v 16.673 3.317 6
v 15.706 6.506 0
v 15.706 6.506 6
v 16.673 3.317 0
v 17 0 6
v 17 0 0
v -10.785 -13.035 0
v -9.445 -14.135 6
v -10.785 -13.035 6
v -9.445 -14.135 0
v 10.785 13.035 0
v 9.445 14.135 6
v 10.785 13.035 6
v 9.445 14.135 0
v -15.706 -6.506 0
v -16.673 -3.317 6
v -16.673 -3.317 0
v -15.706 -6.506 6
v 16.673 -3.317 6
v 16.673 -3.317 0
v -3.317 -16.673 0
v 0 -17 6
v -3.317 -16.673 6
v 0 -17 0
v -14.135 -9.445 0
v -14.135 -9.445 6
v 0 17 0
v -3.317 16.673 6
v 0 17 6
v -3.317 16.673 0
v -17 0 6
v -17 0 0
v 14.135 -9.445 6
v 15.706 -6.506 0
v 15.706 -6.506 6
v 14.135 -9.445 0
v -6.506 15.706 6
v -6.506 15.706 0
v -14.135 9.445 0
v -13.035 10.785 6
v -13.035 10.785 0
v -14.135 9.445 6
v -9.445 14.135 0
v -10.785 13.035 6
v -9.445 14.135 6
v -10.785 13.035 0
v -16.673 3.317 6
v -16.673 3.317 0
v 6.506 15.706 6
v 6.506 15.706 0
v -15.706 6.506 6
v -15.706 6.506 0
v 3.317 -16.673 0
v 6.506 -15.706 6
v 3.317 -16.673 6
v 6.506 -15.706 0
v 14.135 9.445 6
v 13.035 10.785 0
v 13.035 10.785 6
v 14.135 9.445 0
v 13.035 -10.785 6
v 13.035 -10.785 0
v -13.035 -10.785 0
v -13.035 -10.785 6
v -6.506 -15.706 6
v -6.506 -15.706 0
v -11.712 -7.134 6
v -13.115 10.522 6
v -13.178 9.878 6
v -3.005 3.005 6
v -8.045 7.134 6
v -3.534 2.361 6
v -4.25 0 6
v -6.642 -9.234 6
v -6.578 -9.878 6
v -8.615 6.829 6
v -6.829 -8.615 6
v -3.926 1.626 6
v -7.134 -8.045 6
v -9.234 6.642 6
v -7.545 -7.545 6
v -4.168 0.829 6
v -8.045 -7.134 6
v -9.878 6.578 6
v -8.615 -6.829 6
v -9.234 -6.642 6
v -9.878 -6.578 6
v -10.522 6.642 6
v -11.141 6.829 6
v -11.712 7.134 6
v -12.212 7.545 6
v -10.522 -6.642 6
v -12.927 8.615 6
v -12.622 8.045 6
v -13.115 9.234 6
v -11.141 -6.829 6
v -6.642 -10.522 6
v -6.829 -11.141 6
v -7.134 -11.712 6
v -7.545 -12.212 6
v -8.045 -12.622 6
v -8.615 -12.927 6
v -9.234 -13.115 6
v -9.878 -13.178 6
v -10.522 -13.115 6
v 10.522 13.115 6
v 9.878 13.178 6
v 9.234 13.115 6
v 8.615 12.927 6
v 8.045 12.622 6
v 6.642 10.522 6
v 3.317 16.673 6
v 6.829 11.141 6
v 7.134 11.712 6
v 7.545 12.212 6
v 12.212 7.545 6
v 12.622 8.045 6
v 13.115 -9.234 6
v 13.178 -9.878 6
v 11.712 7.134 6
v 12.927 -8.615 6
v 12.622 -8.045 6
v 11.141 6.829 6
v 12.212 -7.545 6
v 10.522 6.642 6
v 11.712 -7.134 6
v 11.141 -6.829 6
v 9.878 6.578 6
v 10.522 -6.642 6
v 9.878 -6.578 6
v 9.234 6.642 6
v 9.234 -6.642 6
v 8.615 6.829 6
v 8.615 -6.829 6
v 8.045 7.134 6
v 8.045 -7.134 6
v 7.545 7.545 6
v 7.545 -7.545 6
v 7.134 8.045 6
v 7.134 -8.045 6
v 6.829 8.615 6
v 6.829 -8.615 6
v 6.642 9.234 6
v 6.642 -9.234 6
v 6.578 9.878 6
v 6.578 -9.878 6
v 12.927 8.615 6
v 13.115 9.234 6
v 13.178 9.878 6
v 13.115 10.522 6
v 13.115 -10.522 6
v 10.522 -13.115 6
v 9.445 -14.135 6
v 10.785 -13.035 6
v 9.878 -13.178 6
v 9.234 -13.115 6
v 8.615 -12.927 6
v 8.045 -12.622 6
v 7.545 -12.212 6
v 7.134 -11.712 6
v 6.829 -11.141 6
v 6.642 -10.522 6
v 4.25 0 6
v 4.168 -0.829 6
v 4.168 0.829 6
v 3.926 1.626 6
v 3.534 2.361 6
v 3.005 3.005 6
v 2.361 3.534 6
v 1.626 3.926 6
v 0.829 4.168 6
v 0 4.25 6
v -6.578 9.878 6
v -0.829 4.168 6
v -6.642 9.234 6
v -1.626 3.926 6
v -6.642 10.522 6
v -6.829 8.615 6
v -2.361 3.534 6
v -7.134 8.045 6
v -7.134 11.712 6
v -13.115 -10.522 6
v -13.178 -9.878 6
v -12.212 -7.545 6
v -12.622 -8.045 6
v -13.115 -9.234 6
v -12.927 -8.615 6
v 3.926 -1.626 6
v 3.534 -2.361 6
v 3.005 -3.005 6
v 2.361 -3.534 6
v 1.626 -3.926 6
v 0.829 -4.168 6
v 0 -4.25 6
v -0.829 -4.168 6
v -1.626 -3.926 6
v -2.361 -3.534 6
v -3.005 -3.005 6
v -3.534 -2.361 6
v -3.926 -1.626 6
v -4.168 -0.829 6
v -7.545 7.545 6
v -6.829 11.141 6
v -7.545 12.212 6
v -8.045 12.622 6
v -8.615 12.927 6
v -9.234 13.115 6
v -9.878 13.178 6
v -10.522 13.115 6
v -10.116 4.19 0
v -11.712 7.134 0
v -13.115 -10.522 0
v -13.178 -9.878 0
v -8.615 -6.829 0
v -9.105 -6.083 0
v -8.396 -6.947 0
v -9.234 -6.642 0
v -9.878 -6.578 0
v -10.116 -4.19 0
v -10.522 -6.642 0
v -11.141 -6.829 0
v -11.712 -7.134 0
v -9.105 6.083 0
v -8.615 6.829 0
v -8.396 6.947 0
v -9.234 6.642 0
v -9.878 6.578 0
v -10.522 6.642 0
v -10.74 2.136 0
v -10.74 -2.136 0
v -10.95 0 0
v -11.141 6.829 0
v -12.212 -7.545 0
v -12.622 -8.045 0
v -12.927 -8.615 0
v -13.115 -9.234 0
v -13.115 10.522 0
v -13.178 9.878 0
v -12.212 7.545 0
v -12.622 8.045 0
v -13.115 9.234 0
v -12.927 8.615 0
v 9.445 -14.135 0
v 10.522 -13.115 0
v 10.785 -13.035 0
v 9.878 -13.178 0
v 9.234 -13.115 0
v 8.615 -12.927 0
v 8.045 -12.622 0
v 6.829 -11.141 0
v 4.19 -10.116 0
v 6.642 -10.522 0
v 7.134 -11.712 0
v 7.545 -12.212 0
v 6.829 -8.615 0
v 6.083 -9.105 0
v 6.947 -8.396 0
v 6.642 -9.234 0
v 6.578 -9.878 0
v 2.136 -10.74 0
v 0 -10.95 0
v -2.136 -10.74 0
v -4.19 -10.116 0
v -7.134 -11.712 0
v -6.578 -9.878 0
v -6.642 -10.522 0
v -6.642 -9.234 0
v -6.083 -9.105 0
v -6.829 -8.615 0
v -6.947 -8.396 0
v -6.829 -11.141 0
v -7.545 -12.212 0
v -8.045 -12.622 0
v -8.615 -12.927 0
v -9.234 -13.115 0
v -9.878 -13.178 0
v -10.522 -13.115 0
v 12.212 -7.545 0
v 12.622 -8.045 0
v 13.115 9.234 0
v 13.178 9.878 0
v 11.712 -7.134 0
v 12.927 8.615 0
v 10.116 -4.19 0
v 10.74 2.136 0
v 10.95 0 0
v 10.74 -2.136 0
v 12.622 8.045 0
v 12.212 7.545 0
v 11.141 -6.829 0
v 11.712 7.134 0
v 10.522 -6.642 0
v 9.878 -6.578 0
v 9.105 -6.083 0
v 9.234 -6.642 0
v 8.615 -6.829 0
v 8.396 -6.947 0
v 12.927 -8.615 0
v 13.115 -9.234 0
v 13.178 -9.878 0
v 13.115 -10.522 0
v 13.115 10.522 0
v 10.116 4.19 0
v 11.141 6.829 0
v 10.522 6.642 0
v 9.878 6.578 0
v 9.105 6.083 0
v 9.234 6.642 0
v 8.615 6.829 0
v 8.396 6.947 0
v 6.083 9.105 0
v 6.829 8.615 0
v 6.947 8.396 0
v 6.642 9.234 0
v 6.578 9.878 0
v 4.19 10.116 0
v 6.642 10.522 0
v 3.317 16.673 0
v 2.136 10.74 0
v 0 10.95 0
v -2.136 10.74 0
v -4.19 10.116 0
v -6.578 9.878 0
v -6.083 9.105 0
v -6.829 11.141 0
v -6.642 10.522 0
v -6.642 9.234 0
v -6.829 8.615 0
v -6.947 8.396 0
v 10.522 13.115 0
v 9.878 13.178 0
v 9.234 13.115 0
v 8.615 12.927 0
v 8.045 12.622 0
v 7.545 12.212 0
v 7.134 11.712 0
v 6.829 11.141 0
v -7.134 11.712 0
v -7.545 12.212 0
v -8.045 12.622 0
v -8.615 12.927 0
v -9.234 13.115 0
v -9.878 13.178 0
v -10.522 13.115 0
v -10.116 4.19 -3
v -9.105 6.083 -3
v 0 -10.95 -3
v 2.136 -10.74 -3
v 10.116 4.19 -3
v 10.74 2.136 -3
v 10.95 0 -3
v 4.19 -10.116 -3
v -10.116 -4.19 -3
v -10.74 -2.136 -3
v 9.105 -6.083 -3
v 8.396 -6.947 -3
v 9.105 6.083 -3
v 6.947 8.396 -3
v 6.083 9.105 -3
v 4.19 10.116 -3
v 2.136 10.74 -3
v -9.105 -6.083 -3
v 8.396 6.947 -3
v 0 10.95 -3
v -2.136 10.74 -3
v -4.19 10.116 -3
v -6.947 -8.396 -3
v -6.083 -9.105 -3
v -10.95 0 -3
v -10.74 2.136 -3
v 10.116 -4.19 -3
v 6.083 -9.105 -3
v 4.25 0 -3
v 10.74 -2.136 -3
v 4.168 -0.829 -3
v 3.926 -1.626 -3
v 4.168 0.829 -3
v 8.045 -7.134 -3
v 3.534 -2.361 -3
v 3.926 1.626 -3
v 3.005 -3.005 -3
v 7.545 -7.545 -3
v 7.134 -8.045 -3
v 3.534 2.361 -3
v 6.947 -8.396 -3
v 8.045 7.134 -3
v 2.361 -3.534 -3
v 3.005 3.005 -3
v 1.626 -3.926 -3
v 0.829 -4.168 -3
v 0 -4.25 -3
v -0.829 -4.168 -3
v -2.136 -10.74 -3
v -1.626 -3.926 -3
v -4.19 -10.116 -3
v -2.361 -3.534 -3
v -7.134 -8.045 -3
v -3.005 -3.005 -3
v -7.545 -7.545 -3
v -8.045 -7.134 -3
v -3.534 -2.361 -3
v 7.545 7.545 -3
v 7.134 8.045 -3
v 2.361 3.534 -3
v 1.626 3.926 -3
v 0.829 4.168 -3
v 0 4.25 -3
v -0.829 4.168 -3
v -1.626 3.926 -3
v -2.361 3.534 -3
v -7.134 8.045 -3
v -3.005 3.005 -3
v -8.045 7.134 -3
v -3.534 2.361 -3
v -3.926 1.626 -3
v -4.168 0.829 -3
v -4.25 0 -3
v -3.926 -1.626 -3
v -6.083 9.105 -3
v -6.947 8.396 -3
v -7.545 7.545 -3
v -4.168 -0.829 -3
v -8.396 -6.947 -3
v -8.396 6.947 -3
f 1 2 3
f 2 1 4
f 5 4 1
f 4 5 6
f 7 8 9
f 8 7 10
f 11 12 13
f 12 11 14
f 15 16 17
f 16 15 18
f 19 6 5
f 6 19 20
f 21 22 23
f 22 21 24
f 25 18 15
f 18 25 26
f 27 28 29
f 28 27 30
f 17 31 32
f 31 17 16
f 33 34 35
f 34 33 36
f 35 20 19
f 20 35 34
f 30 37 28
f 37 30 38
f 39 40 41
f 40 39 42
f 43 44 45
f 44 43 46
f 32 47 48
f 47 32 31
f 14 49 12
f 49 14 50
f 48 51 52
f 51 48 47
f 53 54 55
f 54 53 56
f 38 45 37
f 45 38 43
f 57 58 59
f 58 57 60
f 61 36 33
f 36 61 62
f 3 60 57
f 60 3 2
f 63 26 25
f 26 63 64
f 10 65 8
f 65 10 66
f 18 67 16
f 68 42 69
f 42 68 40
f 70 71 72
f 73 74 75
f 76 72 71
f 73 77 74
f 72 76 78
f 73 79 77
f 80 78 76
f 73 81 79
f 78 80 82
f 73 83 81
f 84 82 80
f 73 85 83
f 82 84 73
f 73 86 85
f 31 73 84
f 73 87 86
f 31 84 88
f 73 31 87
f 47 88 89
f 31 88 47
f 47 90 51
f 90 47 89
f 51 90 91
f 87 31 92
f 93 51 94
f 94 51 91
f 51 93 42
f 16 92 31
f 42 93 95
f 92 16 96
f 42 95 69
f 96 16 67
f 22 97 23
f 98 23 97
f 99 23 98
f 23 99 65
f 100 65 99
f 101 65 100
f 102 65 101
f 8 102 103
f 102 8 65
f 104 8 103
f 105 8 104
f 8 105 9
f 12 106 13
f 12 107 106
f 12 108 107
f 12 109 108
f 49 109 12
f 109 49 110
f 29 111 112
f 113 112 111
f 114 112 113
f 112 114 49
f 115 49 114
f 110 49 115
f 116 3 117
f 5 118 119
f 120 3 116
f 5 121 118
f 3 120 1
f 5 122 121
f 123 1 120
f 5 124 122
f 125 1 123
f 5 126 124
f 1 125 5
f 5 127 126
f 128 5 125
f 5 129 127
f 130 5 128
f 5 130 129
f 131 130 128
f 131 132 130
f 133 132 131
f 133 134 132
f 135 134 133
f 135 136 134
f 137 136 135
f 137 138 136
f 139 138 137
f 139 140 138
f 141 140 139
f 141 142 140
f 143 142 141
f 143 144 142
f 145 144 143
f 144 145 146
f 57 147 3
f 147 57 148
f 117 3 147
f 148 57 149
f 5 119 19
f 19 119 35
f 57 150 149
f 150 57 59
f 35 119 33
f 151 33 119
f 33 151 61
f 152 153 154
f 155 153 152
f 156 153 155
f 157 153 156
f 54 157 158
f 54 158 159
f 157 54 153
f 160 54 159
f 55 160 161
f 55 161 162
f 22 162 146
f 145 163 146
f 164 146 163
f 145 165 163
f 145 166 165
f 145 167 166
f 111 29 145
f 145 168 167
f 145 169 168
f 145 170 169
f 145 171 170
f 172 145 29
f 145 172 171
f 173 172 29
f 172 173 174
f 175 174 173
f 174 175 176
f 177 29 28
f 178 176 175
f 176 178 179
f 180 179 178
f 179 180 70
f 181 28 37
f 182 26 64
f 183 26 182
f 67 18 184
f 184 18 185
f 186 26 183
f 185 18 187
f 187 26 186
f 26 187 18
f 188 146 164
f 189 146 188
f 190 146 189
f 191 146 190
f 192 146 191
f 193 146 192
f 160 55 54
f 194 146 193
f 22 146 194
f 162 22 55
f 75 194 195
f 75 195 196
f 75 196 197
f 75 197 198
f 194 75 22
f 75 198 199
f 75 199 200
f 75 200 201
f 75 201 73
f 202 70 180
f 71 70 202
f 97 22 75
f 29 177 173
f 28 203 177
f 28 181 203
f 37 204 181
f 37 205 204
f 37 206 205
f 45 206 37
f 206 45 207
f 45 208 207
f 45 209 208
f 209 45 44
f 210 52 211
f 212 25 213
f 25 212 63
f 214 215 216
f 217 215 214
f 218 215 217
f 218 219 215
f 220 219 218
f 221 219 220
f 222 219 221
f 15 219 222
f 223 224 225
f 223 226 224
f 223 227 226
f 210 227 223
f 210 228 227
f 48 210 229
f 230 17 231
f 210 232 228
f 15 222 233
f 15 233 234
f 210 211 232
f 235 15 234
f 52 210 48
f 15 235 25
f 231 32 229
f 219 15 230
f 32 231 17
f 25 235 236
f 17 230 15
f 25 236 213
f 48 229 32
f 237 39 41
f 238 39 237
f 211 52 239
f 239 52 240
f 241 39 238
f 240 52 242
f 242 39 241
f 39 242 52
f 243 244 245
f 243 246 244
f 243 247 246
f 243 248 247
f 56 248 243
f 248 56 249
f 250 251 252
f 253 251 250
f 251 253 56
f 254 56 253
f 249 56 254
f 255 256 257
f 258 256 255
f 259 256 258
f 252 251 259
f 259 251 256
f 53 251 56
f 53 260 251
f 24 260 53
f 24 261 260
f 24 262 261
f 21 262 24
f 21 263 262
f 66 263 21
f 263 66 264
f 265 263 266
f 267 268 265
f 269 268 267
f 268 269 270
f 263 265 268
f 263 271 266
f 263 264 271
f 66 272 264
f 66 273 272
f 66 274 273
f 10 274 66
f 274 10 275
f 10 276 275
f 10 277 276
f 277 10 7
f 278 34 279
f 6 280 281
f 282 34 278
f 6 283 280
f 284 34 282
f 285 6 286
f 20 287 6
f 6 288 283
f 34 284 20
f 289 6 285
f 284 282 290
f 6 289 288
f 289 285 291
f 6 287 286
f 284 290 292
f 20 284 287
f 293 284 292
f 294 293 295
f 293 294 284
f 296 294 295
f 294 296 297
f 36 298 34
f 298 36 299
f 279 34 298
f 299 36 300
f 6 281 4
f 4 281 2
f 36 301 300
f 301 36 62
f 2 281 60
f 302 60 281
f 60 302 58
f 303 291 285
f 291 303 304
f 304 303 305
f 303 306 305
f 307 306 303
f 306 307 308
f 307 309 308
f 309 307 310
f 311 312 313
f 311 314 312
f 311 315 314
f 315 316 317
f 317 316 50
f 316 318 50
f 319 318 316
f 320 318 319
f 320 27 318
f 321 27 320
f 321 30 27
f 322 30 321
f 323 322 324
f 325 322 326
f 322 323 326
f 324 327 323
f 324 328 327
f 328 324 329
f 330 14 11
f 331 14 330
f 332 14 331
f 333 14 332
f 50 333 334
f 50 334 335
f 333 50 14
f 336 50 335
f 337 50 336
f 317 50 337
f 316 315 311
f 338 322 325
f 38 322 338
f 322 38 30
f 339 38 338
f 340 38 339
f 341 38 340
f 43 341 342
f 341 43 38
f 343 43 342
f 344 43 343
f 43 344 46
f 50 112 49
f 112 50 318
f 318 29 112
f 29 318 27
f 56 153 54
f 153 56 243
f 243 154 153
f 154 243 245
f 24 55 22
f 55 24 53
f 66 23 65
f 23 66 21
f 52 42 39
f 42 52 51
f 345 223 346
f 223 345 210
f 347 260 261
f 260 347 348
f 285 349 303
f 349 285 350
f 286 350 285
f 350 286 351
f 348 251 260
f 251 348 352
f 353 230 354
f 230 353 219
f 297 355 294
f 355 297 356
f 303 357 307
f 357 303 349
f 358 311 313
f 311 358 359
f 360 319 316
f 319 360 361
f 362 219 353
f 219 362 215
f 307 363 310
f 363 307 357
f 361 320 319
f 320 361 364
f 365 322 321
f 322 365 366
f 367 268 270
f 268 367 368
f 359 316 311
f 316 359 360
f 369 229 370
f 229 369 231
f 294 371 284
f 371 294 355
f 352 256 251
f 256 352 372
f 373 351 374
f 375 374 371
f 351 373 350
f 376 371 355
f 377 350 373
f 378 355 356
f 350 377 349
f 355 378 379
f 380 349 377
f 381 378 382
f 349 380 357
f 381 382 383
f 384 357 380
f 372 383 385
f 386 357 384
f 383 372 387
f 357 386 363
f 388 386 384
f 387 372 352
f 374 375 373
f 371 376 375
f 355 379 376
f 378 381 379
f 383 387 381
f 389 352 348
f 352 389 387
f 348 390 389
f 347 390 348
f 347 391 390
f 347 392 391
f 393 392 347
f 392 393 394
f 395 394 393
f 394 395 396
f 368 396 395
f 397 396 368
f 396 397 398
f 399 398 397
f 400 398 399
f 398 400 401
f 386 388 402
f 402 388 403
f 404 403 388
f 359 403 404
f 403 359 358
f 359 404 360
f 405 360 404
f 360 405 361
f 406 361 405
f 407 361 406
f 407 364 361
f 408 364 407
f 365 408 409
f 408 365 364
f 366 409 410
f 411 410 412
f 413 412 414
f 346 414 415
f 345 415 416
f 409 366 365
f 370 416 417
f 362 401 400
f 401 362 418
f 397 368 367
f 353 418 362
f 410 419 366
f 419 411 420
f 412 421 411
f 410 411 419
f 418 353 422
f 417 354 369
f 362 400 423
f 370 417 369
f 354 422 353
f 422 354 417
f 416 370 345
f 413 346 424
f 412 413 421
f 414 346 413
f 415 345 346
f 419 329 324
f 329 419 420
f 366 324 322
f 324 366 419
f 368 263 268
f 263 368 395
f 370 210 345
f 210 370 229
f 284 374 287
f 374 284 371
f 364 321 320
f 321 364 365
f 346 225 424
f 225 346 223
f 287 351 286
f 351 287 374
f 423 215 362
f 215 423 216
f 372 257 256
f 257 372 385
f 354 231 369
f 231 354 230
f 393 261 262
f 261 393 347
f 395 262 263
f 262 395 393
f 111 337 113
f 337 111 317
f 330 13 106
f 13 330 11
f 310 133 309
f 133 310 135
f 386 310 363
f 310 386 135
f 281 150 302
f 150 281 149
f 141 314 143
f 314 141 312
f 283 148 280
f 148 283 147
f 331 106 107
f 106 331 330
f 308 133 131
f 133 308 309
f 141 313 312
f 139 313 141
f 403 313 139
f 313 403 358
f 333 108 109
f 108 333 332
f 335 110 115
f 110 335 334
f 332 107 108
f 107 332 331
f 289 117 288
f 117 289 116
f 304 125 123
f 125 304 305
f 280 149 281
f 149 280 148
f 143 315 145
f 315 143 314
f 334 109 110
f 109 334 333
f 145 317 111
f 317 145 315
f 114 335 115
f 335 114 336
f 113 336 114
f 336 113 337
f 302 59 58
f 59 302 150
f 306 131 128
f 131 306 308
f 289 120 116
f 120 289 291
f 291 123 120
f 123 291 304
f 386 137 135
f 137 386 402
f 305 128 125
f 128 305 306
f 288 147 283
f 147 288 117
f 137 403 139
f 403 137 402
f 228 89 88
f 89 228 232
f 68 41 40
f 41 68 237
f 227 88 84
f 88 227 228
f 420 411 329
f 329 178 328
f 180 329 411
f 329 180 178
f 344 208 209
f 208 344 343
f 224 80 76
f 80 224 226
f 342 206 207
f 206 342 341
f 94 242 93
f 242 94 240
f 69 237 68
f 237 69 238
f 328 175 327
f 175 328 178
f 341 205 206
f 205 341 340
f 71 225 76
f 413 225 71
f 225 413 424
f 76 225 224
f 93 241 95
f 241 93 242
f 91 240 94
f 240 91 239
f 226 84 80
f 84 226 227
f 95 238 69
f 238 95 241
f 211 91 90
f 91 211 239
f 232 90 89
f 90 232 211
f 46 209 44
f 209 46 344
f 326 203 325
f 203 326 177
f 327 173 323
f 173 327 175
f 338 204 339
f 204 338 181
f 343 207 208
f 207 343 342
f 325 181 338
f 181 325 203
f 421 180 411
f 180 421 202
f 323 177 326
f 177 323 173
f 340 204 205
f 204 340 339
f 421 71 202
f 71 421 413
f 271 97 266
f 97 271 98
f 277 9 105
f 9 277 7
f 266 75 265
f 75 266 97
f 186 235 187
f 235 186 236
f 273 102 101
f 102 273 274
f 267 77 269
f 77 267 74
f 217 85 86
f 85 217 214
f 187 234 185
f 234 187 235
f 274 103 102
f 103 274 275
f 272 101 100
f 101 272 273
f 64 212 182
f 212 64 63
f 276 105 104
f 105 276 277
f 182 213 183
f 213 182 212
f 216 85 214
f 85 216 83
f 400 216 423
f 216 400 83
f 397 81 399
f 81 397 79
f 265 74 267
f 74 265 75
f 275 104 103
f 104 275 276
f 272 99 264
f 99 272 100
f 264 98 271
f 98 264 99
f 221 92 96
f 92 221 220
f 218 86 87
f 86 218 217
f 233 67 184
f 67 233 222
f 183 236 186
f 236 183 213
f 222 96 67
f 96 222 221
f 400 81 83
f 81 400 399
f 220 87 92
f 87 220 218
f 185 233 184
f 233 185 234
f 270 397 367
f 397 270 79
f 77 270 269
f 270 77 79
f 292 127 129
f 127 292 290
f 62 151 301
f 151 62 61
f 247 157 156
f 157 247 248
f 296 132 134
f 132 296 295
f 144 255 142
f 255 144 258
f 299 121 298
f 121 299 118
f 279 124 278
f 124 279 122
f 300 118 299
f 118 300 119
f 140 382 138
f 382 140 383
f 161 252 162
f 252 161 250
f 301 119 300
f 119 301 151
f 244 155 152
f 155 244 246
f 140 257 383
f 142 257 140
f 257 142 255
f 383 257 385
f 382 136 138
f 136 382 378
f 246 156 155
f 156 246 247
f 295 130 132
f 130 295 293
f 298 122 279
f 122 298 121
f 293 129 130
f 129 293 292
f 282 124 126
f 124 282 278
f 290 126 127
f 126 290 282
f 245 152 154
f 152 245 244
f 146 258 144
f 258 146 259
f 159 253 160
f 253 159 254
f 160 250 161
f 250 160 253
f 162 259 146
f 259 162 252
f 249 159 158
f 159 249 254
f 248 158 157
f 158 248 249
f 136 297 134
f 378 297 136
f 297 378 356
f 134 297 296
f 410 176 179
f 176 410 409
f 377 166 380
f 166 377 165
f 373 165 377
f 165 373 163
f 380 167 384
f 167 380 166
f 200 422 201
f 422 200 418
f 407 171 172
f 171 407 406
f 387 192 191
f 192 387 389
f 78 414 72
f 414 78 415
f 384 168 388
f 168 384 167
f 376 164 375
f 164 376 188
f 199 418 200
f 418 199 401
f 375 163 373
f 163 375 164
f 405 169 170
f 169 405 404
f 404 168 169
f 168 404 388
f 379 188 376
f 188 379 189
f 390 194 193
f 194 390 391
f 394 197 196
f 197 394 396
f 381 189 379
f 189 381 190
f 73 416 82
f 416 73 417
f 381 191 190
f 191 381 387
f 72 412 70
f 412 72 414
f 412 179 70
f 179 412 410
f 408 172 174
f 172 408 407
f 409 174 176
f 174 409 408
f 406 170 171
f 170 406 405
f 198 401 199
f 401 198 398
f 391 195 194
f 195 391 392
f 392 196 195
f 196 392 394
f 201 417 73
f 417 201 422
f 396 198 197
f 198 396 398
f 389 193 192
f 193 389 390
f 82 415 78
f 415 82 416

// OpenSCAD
$fn = 32;

// ----------------------------------------------------------------------
// Retaining cap: 608 cover, 34 mm, spigot 21.9 mm
// ----------------------------------------------------------------------

// --- parameters (mm) ---
cap_d = 34;               // cover diameter
cap_t = 6;                // cover thickness
lip_d = 21.9;             // spigot that enters the housing
lip_h = 3;                // spigot height
shaft_d = 8.5;            // shaft opening
bolt_d = 6.6;             // bolt clearance
bolt_r = 13.97;           // bolt circle radius

module cover() {
  cylinder(h = cap_t, d = cap_d);
}

module spigot() {
  /* sunk 1 mm into the cover; the spigot sets the overall height */
  translate([0, 0, -lip_h]) cylinder(h = lip_h + 1, d = lip_d);
}

difference() {
  union() {
    cover();
    spigot();
  }
  for (i = [0 : 3]) rotate([0, 0, 45 + i * 90]) translate([bolt_r, 0, -lip_h - 1])
    cylinder(h = lip_h + cap_t + 2, d = bolt_d);
  translate([0, 0, -lip_h - 1]) cylinder(h = lip_h + cap_t + 2, d = shaft_d);
}
